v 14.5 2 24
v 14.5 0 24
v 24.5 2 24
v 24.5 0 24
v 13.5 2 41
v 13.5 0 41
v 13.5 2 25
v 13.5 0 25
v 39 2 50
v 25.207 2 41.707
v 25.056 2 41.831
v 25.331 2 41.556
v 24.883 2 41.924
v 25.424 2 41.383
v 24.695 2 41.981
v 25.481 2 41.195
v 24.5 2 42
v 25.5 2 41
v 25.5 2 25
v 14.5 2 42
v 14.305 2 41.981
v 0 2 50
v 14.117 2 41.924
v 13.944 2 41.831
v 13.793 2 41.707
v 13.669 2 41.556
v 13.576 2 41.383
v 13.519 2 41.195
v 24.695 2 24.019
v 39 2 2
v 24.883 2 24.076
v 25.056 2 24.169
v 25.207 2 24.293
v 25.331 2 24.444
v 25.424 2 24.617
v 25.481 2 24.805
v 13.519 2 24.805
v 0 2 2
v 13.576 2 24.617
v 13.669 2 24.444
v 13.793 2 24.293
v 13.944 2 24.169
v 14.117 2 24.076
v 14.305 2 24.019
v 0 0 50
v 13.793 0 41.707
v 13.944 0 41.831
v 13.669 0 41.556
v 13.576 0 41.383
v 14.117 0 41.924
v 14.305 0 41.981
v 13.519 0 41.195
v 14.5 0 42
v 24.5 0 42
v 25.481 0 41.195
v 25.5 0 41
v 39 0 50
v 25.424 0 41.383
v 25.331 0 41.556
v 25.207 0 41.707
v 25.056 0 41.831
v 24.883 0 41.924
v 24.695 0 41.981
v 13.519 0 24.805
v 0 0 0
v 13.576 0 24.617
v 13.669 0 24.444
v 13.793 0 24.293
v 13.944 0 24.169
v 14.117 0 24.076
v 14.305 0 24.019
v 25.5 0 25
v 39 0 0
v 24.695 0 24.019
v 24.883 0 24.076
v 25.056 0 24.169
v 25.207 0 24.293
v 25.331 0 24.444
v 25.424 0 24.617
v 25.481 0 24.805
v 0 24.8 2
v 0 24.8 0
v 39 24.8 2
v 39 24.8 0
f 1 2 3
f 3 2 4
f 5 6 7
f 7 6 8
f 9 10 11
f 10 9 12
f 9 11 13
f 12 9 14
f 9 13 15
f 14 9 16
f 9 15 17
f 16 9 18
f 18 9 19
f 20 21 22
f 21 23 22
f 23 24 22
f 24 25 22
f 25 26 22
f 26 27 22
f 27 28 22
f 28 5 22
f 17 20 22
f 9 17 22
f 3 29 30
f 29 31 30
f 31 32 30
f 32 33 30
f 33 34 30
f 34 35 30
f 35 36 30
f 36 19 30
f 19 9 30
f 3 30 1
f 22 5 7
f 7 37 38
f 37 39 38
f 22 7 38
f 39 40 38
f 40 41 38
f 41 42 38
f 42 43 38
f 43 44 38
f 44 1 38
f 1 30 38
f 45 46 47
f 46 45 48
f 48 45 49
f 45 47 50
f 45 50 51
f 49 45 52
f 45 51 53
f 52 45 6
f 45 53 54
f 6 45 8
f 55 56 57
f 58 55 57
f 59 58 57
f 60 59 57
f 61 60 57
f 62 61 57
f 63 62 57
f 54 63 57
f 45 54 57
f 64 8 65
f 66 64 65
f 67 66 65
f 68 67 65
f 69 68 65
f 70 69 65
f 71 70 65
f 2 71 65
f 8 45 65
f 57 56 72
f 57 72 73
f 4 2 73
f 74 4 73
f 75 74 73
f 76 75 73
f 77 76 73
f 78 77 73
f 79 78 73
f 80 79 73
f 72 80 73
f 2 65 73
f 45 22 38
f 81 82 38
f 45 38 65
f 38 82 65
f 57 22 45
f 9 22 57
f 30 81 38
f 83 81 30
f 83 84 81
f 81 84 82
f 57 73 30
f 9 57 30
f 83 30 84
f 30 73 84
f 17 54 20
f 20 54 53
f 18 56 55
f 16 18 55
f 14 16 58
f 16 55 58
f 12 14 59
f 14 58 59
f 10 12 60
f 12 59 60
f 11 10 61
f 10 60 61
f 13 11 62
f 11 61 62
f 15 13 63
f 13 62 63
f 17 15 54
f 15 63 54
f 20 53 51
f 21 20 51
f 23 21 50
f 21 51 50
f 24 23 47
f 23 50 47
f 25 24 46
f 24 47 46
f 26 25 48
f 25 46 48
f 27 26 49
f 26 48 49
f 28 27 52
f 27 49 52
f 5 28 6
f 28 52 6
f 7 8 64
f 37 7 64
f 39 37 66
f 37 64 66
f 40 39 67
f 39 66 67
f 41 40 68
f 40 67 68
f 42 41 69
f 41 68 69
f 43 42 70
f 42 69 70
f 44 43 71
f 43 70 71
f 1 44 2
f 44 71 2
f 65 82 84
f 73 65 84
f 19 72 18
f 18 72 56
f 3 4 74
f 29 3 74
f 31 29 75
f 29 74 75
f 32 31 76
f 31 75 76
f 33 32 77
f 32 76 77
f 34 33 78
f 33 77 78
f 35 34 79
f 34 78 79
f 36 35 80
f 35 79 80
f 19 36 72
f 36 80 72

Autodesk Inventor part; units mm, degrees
ref_plane "YZ Plane" through (0, 0, 0) normal (1, 0, 0) x (0, 1, 0)
ref_plane "XZ Plane" through (0, 0, 0) normal (0, 1, 0) x (-1, 0, 0)
ref_plane "XY Plane" through (0, 0, 0) normal (0, 0, 1) x (1, 0, 0)
sketch "Sketch1" plane through (0, 0, 0) normal (0, 0, 1) x (1, 0, 0)
  line L0 (0, 0) -> (39, 0)
  line L1 (39, 0) -> (39, 24.8)
  line L2 (39, 24.8) -> (0, 24.8)
  line L3 (0, 24.8) -> (0, 0)
  dimension "d0" = 39
  dimension "d1" = 24.8
extrude "Extrusion1" add sketch "Sketch1" along normal blind 2
sketch "Sketch2" plane through (0, 0, 2) normal (0, 0, 1) x (1, 0, 0)
  line L0 (0, 24.8) -> (0, 0) projected
  line L1 (0, 0) -> (39, 0)
  line L2 (39, 0) -> (39, 2)
  line L3 (39, 2) -> (0, 2)
  line L4 (0, 2) -> (0, 0)
  dimension "d4" = 39
  dimension "d5" = 2
extrude "Extrusion2" add sketch "Sketch2" along normal blind 48
sketch "Sketch3" plane through (0, 0, 0) normal (0, -1, 0) x (1, 0, 0)
  line L0 (0, 0) -> (39, 0) projected
  line L1 (19.5, 24) -> (24.5, 24)
  line L2 (25.5, 25) -> (25.5, 41)
  line L3 (24.5, 42) -> (14.5, 42)
  line L4 (13.5, 41) -> (13.5, 25)
  line L5 (14.5, 24) -> (19.5, 24)
  arc A0 (14.5, 42) -> (13.5, 41) centre (14.5, 41) ccw
  arc A1 (24.5, 24) -> (25.5, 25) centre (24.5, 25) ccw
  arc A2 (25.5, 41) -> (24.5, 42) centre (24.5, 41) ccw
  arc A3 (13.5, 25) -> (14.5, 24) centre (14.5, 25) ccw
  point P0 (25.5, 24)
  point P1 (25.5, 42)
  point P2 (13.5, 42)
  point P3 (13.5, 24)
  dimension "d9" = 6
  dimension "d10" = 18
  dimension "d11" = 12
  dimension "d12" = 18
  dimension "d13" = 1
extrude "Extrusion3" cut sketch "Sketch3" against normal blind 48
properties part number "Kamera 2"
